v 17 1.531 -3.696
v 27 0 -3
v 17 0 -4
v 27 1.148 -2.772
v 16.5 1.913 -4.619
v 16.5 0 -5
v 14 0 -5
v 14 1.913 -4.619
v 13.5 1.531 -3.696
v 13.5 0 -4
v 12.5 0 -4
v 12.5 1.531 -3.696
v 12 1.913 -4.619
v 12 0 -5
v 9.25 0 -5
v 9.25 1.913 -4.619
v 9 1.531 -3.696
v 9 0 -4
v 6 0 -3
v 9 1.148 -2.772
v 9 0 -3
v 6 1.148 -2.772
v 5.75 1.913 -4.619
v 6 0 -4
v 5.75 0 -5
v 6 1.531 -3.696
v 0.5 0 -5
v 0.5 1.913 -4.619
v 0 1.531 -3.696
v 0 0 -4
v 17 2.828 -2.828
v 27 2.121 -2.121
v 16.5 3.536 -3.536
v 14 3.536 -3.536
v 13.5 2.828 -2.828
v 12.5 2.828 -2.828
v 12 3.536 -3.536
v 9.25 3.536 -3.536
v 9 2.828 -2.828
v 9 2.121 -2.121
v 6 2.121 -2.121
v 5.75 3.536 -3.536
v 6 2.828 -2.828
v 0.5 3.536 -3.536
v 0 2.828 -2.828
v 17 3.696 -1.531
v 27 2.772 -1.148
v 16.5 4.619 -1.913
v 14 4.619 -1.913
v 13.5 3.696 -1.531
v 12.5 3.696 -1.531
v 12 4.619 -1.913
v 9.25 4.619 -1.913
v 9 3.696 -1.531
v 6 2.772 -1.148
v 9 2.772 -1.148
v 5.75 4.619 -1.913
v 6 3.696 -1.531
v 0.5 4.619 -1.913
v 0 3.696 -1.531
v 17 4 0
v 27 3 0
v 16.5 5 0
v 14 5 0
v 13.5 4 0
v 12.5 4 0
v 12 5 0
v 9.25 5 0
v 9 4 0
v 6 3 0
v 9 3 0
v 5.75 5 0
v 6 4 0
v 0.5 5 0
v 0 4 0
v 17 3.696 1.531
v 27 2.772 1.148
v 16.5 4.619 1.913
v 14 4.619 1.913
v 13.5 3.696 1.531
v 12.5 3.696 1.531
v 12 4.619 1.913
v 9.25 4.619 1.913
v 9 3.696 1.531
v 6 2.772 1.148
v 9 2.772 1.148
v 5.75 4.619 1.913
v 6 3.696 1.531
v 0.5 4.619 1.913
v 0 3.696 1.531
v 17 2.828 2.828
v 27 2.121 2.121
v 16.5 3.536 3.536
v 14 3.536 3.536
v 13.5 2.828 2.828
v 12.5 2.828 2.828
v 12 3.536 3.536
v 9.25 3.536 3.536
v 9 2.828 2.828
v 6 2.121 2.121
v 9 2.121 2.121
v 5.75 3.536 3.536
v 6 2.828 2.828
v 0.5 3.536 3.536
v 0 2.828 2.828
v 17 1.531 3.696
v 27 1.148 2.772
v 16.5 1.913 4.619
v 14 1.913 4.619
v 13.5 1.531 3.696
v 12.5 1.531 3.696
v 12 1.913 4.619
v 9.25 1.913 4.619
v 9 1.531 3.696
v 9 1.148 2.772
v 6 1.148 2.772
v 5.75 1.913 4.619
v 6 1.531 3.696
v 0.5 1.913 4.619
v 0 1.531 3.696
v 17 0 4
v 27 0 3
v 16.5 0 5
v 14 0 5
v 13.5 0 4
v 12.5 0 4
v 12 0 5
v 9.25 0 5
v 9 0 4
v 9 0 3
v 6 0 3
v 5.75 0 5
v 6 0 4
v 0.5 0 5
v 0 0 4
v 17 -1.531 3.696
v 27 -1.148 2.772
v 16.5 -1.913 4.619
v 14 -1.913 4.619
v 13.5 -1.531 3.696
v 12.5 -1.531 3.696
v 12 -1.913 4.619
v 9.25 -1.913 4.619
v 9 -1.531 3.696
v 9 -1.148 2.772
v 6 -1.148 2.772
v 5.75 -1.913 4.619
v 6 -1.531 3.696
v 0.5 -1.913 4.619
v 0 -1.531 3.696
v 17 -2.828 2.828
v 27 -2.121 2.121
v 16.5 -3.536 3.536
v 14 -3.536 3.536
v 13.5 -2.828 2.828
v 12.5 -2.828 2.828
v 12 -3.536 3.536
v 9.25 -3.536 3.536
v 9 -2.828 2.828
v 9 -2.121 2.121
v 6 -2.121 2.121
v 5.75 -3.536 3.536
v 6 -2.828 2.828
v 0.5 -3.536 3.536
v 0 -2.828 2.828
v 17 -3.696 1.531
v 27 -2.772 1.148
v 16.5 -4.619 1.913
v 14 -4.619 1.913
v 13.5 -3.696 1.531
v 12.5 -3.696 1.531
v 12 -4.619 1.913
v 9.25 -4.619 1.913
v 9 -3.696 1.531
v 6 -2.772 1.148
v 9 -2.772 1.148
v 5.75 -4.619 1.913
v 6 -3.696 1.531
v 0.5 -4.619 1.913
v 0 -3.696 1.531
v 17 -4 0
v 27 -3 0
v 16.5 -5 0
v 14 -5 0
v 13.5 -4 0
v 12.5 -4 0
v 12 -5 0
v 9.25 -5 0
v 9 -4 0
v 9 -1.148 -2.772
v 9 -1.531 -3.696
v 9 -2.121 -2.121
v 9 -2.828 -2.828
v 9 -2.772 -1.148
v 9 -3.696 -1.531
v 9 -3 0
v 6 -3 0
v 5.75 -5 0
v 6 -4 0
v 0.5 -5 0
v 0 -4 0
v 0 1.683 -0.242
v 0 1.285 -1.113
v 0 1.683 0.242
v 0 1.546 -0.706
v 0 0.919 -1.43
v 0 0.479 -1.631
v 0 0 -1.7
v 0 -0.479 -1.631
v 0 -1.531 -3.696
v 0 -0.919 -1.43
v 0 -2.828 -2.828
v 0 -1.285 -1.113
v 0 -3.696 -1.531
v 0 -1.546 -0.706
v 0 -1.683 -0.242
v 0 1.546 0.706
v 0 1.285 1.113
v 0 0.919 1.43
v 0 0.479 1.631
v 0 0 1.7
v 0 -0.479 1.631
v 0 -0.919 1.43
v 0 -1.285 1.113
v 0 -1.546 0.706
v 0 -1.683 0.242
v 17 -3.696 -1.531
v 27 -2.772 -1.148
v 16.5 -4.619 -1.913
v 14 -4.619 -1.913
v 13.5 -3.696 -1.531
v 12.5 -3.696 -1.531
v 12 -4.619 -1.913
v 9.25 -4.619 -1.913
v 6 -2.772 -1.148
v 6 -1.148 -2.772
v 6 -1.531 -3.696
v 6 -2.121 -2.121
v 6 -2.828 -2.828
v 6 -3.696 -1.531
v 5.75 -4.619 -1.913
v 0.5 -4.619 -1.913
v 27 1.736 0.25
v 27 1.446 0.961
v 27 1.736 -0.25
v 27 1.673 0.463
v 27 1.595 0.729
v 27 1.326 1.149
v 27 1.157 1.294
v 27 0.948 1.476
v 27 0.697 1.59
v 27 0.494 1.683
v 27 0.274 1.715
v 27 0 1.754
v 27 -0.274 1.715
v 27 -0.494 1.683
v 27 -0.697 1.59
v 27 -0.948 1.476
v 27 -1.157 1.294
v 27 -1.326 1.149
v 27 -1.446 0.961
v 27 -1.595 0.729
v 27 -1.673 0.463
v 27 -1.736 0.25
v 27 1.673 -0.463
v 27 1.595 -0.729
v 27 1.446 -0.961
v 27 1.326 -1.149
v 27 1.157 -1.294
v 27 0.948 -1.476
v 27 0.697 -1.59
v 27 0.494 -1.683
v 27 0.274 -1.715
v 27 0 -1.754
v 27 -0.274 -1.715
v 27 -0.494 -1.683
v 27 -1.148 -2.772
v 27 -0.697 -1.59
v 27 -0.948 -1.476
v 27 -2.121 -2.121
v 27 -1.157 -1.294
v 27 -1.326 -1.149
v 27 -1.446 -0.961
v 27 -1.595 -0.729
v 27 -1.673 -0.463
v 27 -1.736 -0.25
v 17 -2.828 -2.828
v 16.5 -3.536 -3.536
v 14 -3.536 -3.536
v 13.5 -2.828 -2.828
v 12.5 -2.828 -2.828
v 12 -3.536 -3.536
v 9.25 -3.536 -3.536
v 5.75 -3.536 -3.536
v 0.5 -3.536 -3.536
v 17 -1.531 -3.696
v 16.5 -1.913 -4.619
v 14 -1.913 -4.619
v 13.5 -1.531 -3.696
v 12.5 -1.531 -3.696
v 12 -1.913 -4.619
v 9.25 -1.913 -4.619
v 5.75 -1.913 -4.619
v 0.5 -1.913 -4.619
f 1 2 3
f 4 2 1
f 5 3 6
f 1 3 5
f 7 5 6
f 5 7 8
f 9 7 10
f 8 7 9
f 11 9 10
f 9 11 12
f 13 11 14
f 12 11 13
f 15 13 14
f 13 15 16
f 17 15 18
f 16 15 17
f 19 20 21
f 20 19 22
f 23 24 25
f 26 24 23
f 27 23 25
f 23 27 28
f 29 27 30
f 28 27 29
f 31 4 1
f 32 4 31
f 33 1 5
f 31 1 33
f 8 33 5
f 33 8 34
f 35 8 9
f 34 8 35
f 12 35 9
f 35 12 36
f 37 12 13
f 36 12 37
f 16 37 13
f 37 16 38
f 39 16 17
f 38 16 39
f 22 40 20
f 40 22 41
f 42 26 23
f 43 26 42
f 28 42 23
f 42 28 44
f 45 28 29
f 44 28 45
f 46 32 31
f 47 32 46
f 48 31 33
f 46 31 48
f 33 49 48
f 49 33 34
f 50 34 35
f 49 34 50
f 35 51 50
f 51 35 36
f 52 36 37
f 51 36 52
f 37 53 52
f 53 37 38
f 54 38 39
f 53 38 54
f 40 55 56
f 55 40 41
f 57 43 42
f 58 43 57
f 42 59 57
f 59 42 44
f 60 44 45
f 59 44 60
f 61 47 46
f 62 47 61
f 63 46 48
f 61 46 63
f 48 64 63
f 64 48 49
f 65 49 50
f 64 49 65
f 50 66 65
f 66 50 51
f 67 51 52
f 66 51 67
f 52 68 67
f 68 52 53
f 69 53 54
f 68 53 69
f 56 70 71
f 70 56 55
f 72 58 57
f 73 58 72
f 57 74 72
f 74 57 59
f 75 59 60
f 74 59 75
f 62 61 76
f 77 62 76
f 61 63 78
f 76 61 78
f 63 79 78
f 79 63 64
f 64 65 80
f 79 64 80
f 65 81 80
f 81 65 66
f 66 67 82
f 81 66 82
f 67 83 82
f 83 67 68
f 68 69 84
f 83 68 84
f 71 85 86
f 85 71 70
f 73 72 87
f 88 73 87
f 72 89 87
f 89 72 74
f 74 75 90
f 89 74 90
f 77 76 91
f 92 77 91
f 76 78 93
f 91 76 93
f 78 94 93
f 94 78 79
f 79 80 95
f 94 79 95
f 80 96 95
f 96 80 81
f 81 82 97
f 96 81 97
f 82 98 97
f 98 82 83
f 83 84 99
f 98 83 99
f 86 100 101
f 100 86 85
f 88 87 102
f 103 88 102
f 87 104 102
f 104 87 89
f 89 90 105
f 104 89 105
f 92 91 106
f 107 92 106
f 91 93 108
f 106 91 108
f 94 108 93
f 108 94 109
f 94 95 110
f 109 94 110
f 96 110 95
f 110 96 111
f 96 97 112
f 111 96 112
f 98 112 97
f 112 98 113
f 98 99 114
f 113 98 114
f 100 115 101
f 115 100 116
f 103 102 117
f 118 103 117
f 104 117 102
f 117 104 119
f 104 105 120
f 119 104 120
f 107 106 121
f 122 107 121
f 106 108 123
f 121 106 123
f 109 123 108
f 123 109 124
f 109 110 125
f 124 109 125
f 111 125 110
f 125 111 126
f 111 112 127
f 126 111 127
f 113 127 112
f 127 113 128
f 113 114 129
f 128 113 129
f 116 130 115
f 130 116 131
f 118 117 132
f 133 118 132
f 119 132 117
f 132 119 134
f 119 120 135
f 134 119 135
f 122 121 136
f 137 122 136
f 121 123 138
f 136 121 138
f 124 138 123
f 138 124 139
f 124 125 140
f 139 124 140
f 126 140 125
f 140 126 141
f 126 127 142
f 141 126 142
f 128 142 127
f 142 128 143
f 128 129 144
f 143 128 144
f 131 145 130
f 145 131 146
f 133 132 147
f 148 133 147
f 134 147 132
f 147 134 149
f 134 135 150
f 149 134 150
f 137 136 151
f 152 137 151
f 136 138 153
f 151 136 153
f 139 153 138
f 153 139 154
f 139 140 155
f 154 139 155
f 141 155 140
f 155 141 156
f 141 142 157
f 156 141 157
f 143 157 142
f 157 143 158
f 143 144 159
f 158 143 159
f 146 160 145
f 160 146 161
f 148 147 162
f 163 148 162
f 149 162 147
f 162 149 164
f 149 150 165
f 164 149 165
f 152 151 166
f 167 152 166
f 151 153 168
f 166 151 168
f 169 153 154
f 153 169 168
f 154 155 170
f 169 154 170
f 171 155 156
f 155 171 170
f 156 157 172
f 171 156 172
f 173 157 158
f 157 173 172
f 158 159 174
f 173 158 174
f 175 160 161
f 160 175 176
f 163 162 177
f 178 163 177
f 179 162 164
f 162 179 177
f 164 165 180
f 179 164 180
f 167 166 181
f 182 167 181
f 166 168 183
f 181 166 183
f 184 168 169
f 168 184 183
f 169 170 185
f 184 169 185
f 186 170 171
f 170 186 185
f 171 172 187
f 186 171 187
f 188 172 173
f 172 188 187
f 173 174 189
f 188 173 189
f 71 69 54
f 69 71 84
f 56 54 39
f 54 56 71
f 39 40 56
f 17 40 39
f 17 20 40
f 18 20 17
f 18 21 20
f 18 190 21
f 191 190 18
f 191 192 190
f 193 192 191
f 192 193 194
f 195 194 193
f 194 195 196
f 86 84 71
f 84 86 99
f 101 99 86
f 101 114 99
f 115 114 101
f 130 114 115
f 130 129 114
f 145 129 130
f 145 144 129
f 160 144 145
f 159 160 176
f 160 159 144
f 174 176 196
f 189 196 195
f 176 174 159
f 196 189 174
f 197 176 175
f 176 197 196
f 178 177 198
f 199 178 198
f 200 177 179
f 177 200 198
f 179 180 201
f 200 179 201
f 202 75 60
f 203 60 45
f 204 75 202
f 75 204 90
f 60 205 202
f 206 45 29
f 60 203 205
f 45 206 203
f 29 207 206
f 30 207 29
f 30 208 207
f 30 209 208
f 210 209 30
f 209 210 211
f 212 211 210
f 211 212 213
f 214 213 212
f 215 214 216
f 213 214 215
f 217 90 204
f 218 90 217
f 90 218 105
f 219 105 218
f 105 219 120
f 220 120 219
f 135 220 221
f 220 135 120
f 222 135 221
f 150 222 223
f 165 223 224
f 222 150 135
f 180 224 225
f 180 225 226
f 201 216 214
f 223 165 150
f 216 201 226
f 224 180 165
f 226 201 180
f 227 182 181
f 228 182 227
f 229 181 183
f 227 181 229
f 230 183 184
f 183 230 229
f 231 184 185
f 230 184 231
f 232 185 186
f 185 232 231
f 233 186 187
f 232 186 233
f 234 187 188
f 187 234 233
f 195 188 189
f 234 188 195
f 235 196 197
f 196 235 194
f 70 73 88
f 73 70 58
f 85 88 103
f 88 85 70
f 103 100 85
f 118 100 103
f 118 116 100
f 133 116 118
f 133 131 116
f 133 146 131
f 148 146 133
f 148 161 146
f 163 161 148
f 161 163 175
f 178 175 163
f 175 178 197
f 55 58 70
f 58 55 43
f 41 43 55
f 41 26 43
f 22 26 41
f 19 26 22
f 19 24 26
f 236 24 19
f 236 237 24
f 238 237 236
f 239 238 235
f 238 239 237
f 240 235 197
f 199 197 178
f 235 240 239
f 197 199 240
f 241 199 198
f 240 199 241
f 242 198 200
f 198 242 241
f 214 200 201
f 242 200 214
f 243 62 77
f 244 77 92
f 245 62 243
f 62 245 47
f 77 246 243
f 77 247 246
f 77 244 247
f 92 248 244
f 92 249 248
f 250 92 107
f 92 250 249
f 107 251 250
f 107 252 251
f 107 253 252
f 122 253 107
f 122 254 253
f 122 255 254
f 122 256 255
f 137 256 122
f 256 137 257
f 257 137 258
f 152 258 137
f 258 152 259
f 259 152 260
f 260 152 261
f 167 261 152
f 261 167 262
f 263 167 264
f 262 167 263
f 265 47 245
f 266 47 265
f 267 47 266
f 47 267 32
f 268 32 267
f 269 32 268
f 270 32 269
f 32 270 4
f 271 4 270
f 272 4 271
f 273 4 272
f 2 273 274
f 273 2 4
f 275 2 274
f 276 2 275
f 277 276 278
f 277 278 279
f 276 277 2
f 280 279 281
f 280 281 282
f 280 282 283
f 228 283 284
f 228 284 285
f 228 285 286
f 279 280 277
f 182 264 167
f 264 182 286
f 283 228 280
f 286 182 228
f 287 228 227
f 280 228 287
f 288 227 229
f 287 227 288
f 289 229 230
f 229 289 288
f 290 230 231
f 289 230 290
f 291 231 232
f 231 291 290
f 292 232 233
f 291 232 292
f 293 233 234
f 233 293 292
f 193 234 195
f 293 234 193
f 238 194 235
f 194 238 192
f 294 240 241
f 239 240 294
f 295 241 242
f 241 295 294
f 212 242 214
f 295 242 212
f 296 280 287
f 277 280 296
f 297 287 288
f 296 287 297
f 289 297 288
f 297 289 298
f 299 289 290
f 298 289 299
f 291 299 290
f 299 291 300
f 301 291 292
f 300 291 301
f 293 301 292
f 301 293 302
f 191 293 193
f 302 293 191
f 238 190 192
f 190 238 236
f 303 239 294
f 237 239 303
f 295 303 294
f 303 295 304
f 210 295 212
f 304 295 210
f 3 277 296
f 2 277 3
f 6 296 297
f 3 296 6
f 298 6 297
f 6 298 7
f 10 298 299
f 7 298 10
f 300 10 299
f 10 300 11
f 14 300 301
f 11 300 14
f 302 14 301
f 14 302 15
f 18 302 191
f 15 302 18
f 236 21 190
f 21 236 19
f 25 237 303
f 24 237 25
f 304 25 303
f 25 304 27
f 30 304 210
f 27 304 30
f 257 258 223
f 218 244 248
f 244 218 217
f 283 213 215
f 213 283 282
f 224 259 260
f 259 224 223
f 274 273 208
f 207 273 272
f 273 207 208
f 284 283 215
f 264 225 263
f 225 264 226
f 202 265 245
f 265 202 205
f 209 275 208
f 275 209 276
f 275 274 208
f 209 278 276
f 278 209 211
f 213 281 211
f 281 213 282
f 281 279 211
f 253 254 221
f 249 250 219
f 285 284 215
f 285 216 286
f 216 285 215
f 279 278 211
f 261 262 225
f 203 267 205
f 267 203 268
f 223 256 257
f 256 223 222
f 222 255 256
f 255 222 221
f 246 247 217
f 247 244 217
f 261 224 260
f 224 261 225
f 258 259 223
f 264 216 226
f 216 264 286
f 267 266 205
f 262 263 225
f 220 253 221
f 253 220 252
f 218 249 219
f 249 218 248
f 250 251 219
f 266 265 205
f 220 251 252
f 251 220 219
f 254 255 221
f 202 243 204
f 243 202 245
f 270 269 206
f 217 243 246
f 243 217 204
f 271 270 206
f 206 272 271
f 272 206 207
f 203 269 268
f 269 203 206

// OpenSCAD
// Lights1b
// Ferrules for 3 mm fiber optic sideglows

// Try a rotated build
p1=[ [0,0], [0,4], [0.5,5], [5.75,5], [6,4], [6,3], [9.,3], [9,4], [9.25,5], [12,5], [12.5,4], [13.5,4],
  [14,5], [16.5,5], [17,4], [27,3], [27,0] ];

difference(){
rotate([0,-90,0])
rotate_extrude(){
rotate([0,0,-90])
polygon(points=p1);
}    
color("cyan")
// measured 2.5, 2.6 diameter
//cylinder(r1=1.6,r2=1.7, h=50,$fn=22);

rotate([0,90,0])
// just a tad too large
//cylinder(r1=1.8,r2=1.9, h=50,$fn=22);
cylinder(r1=1.7,r2=1.8, h=50,$fn=22);
}
